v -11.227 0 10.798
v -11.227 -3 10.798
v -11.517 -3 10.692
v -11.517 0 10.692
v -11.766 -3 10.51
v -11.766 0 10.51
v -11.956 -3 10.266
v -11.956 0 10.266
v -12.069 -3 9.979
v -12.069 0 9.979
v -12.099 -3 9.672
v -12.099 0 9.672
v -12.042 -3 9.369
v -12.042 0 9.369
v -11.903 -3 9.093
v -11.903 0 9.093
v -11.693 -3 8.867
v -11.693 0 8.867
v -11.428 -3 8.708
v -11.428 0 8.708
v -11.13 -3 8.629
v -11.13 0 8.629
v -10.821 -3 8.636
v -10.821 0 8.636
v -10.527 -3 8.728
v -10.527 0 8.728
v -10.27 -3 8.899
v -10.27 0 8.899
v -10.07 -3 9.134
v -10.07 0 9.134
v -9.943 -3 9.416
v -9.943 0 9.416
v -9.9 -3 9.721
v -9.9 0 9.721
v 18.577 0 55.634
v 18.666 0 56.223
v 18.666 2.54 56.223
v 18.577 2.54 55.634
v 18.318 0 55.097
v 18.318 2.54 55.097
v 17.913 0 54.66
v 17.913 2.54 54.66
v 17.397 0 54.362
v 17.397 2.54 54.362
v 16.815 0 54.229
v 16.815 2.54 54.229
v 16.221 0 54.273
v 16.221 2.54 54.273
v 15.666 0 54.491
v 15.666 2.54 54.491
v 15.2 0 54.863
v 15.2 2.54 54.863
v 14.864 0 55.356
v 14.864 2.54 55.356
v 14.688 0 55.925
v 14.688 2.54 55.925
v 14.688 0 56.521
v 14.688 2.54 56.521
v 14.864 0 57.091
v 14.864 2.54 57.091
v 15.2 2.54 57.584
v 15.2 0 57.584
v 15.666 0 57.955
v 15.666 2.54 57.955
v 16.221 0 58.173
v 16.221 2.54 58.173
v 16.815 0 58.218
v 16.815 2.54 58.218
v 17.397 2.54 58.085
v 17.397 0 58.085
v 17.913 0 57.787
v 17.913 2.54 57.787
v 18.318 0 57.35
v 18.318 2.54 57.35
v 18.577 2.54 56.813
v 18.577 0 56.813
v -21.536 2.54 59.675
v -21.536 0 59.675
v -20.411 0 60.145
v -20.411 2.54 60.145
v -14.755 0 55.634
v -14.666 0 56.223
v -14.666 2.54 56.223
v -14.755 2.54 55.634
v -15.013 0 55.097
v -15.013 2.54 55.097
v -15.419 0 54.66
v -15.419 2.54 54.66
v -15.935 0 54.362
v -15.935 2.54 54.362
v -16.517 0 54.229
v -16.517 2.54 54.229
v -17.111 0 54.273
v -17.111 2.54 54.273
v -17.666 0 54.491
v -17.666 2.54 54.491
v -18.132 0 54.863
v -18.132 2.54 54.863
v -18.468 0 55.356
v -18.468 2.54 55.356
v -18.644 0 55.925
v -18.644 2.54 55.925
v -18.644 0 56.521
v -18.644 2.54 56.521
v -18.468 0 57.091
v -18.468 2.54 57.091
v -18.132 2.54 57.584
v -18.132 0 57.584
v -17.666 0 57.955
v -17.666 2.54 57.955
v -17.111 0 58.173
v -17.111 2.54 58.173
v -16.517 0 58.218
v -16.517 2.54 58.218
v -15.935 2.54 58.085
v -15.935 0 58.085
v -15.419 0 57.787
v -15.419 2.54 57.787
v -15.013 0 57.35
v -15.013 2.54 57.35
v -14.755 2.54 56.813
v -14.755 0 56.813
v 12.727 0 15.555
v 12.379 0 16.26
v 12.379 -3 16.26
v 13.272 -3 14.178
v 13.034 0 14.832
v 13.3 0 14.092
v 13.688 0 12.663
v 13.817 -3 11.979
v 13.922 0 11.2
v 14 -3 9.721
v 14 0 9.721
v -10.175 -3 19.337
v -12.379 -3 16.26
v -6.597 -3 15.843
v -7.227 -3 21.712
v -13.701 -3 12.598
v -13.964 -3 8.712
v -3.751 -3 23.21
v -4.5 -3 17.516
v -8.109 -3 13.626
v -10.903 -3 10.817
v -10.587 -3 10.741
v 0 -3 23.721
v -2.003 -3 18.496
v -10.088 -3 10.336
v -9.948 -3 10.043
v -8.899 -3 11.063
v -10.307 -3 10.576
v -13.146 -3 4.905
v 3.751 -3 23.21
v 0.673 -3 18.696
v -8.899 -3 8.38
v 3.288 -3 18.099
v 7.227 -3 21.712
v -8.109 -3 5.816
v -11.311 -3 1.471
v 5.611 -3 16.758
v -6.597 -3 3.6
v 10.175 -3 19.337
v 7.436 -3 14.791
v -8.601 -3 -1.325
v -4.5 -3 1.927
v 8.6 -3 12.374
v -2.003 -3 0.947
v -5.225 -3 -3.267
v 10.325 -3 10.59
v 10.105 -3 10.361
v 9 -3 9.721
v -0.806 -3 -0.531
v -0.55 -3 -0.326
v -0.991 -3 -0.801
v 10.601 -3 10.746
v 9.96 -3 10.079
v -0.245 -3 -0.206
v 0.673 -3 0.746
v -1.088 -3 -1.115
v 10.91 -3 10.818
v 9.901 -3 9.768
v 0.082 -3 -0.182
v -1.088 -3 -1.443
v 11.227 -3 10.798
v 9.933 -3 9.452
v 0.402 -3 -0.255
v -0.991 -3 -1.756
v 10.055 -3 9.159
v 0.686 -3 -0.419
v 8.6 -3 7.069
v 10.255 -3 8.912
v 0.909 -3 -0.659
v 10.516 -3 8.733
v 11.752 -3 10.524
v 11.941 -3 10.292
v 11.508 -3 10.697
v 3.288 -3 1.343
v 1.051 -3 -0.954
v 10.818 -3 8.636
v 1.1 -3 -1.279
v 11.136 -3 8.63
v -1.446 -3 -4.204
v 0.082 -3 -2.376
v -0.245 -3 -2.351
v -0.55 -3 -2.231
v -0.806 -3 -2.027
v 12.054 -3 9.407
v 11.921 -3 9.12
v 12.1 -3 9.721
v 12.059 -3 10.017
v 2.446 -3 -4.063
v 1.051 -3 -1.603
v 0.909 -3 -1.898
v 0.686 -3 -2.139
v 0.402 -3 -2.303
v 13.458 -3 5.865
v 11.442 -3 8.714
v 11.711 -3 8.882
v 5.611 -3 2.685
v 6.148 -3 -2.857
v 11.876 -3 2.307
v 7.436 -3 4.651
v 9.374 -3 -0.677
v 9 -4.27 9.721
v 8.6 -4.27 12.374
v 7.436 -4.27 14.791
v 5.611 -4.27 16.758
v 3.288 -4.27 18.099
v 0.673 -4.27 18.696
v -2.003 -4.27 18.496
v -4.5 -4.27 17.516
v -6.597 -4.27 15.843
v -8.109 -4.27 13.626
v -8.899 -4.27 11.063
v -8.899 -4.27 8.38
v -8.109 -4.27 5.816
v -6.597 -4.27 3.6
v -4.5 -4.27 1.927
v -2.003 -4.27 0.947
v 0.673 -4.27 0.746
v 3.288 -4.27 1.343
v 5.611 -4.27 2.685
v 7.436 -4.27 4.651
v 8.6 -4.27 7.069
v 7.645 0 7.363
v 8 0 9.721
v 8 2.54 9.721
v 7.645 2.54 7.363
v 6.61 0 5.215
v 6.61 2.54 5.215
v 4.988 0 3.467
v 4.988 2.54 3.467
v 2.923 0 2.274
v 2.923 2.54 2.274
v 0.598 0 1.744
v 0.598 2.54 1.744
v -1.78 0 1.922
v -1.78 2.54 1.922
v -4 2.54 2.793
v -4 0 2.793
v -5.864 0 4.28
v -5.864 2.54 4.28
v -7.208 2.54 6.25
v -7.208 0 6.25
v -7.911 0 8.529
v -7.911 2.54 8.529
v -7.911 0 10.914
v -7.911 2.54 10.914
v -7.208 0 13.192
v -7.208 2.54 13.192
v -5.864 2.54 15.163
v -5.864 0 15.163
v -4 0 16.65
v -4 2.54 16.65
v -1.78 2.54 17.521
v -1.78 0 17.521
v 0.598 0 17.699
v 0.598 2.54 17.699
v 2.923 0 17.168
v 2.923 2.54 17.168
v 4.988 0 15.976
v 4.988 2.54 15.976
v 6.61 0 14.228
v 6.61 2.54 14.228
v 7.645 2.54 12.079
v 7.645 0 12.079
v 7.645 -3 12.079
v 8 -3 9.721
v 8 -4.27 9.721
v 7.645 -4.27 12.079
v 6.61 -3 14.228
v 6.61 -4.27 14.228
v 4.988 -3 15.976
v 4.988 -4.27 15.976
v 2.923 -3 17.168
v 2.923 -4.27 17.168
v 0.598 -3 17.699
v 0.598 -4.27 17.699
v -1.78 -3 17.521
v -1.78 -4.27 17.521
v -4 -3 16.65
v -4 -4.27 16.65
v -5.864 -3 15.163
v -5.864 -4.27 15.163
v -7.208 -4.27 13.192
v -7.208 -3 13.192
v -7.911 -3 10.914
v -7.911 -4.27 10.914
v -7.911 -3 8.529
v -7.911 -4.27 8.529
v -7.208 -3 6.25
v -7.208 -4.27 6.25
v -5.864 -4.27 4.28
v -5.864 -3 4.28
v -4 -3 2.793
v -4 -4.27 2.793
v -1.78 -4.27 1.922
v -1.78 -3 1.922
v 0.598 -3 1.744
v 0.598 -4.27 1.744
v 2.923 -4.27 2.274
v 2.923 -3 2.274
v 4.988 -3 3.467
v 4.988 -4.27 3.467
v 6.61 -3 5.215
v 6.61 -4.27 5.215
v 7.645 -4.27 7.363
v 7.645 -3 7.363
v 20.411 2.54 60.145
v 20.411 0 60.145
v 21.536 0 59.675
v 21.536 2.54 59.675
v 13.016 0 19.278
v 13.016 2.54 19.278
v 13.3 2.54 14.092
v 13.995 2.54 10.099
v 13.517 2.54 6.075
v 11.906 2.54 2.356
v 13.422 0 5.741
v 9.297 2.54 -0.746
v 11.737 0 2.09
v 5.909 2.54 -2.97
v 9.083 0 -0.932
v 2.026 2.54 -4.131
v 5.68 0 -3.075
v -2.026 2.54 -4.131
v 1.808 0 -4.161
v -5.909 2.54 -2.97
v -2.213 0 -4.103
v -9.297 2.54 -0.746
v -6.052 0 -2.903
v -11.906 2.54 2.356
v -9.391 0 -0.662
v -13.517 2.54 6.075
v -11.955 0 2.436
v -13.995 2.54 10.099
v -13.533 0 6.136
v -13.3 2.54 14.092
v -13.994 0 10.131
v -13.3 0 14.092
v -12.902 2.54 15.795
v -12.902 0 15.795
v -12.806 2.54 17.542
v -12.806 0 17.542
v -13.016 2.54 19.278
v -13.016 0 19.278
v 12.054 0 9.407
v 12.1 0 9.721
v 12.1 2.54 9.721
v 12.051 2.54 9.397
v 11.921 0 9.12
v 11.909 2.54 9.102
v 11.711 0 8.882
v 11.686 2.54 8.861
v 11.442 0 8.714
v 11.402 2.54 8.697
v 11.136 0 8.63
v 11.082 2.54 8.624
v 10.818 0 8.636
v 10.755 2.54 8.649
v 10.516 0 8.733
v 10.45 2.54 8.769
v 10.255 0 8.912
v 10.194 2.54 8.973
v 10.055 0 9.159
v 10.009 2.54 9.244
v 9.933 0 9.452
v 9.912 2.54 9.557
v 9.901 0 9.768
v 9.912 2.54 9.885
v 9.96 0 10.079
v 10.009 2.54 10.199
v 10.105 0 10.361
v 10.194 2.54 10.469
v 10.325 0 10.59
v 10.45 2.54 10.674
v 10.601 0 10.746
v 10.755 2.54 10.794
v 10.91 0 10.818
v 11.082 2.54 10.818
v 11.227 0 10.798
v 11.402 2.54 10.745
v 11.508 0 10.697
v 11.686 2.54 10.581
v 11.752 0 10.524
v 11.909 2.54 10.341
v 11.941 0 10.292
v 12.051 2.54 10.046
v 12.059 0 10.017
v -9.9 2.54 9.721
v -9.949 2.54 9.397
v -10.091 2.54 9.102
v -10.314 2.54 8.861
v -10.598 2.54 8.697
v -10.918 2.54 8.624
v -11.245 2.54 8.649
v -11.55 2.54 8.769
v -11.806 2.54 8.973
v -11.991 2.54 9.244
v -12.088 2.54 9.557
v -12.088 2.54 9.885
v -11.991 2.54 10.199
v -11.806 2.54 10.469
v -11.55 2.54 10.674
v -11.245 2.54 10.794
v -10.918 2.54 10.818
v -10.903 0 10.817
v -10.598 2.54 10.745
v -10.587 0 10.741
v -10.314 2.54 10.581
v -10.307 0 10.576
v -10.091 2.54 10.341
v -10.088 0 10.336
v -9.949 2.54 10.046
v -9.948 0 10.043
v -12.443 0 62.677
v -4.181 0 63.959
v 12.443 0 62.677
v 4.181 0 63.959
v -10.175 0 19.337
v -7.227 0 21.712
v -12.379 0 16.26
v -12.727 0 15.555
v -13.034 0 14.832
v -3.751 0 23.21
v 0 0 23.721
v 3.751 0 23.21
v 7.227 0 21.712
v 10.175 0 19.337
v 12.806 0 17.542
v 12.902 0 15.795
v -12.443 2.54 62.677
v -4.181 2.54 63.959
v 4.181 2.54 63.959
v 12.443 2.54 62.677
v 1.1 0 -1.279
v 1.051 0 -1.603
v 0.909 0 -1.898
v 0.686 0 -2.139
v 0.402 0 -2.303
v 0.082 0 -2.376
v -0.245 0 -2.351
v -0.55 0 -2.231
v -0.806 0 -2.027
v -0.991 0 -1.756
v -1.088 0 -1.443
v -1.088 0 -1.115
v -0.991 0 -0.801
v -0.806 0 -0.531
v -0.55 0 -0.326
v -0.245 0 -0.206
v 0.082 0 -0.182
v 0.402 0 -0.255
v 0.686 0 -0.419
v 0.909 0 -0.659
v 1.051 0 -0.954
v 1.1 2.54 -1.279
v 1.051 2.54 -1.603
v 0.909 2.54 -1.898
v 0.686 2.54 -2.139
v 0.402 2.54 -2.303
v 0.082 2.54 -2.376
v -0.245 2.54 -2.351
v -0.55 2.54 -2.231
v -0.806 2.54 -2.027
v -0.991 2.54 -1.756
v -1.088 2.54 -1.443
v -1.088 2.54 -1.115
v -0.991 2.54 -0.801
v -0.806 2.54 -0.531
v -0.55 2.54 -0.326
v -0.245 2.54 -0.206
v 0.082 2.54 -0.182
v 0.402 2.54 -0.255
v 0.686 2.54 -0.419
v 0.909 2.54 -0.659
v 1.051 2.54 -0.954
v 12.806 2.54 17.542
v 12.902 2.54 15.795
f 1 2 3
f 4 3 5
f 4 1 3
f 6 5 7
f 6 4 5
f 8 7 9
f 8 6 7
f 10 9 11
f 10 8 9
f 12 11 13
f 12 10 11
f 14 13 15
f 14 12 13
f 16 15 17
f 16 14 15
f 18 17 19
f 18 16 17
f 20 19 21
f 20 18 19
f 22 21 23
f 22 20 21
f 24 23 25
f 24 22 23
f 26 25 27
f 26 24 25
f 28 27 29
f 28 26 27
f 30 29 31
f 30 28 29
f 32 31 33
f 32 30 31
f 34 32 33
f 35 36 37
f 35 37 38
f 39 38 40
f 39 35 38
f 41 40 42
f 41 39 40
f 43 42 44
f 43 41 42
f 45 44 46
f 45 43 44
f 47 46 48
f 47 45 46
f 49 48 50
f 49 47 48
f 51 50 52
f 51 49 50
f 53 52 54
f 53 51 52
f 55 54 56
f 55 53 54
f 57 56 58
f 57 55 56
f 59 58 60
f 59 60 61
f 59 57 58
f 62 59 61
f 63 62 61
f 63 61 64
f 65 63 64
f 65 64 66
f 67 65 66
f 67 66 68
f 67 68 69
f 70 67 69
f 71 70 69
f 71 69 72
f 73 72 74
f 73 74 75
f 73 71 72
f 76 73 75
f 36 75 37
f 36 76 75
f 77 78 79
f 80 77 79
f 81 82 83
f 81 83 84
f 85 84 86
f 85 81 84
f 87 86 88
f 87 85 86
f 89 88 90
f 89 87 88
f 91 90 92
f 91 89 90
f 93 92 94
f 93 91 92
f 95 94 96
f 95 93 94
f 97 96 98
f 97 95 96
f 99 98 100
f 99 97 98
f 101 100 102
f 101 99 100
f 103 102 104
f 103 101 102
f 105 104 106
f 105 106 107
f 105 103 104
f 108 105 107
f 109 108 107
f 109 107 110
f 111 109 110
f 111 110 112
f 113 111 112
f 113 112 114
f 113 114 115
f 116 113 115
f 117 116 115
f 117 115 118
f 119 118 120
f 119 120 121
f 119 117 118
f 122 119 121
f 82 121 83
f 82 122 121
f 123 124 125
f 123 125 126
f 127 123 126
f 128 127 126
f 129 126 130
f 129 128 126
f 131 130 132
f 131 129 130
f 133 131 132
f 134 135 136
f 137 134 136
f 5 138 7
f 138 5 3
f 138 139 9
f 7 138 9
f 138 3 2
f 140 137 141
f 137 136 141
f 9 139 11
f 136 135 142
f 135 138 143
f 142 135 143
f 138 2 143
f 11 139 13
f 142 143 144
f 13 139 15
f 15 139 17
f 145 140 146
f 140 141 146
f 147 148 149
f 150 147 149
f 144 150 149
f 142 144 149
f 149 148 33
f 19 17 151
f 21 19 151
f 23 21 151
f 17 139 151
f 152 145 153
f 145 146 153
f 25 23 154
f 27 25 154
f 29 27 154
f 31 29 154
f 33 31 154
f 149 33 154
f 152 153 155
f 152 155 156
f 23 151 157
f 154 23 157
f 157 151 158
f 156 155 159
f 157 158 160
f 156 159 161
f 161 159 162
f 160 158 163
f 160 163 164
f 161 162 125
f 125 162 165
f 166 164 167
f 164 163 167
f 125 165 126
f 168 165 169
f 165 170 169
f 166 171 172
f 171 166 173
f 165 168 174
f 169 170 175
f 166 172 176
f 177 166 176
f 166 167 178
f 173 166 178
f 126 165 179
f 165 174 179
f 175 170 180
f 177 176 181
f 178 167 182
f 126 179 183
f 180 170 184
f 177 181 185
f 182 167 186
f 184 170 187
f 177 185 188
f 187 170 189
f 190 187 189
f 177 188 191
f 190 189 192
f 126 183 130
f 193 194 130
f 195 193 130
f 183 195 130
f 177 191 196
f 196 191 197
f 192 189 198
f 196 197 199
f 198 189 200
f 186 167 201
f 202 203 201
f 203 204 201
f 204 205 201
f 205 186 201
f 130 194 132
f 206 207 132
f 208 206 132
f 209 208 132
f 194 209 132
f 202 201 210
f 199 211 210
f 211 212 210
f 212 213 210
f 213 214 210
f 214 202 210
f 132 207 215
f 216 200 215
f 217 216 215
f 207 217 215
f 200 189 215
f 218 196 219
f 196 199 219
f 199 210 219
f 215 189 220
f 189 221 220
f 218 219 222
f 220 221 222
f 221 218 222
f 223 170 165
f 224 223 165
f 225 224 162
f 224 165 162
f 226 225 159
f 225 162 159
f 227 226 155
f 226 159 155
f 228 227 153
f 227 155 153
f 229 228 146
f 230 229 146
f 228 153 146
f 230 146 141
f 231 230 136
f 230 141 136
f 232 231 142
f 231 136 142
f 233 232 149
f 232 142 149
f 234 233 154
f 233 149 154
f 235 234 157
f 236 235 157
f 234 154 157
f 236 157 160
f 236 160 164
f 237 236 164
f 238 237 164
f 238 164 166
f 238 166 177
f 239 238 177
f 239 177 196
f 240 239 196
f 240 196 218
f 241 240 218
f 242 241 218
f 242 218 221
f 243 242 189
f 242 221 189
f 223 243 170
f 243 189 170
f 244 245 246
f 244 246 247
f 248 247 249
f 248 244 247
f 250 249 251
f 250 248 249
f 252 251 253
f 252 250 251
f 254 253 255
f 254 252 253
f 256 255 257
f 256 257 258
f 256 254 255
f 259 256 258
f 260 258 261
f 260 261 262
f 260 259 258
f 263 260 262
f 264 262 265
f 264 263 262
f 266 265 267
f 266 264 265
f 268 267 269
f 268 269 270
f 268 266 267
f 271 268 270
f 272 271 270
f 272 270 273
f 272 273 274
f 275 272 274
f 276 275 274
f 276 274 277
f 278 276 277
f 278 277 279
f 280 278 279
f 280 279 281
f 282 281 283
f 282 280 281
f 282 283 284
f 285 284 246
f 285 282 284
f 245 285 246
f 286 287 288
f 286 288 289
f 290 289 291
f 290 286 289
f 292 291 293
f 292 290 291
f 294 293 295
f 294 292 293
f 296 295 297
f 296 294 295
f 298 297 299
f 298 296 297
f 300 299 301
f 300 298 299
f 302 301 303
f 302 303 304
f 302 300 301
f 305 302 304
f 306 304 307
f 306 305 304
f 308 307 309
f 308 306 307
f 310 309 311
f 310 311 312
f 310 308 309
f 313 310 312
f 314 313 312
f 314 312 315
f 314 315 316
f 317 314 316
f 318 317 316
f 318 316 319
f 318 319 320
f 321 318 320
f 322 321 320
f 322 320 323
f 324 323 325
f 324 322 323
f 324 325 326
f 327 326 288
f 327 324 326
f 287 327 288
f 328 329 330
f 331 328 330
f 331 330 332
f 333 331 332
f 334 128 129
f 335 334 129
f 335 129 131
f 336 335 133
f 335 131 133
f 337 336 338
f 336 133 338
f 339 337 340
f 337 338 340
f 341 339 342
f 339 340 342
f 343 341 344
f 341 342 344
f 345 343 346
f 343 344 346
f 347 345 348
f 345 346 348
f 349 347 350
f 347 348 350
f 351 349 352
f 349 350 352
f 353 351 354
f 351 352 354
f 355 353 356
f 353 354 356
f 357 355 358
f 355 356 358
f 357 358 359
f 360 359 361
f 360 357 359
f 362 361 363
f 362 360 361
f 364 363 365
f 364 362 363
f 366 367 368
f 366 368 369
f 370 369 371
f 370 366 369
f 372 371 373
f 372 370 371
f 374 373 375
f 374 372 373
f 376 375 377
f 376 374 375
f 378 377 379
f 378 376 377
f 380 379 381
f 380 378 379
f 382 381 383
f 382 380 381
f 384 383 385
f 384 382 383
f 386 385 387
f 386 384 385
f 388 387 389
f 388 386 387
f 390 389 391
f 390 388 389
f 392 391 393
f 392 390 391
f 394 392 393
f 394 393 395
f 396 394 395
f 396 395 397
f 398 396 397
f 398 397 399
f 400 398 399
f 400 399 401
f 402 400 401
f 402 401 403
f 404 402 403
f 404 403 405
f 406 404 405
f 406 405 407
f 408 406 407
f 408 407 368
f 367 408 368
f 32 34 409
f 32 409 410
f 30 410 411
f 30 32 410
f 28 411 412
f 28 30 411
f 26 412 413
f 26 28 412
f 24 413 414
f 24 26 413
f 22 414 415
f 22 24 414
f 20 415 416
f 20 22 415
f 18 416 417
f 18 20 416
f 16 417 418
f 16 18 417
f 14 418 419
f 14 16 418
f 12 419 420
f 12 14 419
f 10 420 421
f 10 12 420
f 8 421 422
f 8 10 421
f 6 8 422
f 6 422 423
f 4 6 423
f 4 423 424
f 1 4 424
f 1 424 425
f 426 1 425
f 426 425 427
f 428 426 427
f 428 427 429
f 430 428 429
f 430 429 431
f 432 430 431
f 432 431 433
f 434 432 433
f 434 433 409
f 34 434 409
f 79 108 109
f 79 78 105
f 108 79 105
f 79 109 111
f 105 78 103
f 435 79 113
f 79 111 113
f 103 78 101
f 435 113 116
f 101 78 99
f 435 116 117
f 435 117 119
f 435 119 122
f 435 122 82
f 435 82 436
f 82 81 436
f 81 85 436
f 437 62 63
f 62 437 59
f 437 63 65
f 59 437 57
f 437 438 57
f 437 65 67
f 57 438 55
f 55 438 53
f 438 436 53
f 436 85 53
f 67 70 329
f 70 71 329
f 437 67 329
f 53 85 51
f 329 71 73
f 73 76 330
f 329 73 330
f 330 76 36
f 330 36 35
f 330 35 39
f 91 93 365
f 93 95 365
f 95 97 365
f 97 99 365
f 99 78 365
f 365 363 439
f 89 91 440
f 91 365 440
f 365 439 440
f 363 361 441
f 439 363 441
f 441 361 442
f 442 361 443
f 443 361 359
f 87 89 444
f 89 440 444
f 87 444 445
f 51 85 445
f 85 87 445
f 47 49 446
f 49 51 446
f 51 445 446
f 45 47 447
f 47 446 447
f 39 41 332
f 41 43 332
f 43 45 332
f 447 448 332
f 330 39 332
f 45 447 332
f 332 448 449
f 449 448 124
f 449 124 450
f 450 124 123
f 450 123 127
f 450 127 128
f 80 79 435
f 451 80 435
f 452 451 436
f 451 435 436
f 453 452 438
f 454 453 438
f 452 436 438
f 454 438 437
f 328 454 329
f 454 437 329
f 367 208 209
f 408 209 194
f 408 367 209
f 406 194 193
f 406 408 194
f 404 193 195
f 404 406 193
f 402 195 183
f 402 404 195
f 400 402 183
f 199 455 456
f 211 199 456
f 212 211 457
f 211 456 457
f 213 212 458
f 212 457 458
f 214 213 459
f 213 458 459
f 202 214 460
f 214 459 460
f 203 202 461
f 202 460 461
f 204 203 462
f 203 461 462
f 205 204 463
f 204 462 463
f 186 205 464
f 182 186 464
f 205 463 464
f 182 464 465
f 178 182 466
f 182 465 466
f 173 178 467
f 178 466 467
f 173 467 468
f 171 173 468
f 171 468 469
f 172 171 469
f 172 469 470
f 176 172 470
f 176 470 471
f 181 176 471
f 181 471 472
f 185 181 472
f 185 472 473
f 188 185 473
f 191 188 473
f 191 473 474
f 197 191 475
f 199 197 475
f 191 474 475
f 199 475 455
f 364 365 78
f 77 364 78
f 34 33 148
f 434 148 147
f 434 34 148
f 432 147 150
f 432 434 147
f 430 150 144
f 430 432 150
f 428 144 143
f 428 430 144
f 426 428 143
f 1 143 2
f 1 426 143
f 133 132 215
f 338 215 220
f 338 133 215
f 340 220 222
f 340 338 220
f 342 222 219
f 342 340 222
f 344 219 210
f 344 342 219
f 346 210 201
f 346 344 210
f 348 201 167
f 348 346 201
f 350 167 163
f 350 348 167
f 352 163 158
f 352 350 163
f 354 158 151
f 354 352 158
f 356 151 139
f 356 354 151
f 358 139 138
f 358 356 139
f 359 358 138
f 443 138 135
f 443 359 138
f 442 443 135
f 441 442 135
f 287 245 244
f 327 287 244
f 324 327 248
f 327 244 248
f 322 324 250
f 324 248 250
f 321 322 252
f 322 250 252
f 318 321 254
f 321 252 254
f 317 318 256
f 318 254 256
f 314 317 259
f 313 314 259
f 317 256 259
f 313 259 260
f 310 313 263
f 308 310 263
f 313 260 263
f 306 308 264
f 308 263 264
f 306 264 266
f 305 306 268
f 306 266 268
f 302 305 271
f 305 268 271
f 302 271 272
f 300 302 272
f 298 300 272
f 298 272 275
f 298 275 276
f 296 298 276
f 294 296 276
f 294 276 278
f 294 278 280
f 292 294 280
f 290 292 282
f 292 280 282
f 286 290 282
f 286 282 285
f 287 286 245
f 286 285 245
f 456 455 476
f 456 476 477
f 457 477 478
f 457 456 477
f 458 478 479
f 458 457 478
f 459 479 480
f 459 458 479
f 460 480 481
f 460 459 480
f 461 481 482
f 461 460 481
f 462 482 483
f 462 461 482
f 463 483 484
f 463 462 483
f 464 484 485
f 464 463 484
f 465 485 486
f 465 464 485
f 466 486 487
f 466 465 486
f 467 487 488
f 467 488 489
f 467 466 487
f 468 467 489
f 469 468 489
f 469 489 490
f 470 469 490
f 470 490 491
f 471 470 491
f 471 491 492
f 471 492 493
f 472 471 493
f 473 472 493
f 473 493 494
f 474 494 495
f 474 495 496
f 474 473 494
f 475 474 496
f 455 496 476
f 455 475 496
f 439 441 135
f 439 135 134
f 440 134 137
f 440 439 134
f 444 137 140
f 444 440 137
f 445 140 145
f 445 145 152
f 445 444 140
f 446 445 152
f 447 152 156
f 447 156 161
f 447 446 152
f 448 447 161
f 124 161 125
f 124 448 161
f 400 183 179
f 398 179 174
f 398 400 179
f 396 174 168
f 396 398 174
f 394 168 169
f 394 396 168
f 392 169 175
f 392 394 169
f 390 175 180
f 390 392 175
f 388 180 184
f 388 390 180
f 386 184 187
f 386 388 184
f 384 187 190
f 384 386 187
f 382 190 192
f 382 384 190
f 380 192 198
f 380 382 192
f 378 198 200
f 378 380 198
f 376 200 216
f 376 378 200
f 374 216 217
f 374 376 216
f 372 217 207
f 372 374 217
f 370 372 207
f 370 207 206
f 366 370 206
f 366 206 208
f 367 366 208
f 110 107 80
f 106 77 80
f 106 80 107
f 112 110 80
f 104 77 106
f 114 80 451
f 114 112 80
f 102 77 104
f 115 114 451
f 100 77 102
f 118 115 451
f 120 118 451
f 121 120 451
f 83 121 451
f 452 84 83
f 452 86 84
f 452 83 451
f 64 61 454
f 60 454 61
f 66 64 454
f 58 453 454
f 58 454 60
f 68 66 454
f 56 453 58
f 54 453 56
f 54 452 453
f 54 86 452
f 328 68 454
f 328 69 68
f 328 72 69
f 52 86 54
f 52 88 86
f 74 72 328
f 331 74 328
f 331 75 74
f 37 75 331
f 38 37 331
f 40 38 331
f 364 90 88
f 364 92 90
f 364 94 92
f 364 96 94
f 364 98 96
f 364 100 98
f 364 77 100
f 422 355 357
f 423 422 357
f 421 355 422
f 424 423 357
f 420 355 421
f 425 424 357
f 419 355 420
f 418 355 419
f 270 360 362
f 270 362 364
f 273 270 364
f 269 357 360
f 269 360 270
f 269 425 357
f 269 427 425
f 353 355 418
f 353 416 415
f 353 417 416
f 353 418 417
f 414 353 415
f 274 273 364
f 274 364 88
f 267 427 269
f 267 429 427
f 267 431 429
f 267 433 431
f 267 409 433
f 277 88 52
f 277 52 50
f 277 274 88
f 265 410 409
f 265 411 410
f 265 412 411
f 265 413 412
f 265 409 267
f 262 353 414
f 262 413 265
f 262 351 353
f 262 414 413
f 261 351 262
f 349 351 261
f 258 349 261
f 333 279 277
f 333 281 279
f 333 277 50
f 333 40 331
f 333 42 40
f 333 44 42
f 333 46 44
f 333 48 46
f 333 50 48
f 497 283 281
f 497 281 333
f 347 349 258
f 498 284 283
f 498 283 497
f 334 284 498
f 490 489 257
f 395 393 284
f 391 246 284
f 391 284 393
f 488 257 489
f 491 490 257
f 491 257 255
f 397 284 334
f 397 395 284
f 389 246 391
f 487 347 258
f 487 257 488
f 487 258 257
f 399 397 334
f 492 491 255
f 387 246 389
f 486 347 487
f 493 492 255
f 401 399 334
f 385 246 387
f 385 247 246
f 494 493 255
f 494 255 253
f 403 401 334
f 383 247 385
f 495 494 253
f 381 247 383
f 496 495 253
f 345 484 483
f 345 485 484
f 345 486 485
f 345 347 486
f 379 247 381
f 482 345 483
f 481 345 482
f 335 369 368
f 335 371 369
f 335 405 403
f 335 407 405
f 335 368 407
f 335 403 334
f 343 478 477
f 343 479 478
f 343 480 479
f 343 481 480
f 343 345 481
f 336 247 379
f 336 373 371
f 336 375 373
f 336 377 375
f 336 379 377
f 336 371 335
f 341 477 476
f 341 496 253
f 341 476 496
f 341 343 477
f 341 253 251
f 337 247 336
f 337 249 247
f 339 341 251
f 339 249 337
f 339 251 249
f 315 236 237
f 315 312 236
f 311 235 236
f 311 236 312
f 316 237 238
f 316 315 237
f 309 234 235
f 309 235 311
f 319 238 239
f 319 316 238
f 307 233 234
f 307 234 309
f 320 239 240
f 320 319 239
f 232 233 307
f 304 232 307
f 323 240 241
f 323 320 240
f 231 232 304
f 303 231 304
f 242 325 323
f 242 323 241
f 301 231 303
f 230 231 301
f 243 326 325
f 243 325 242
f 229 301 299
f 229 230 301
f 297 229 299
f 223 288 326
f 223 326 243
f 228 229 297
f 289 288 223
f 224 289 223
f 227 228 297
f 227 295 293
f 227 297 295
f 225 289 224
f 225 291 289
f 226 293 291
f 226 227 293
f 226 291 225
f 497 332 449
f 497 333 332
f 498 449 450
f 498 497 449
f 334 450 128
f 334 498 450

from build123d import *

# Parameters (mm, degrees)
SKETCH1_R           = 1.999999943
SKETCH1_R_2         = 1.1
SKETCH1_R_3         = 8
BOSS_EXTRUDE1_DEPTH = 2.54
FILLET2_R           = 10
BOSS_EXTRUDE2_START = -2.999994
SKETCH1_4_R         = 8
SKETCH1_4_R_2       = 1.1
BOSS_EXTRUDE2_DEPTH = 2.999994
BOSS_EXTRUDE3_START = 1.27
SKETCH2_R           = 9
SKETCH2_R_2         = 8
BOSS_EXTRUDE3_DEPTH = 1.27


with BuildPart() as part:
    # Sketch1 → Boss-Extrude1 (new body)
    with BuildSketch(Plane(origin=(0, 0, 0), x_dir=(1, 0, 0), z_dir=(0, 1, 0))):
        with BuildLine():
            Line((20.411129853, -60.145086441), (21.536156884, -59.674942586))
            Line((21.536156884, -59.674942586), (12.379162196, -16.260133485))
            ThreePointArc((12.379162196, -16.260133485), (0, 4.278699998), (-12.379162196, -16.260133485))
            Line((-12.379162196, -16.260133485), (-21.536156884, -59.674942586))
            Line((-21.536156884, -59.674942586), (-20.411129853, -60.145086441))
            ThreePointArc((-20.411129853, -60.145086441), (0, -64.119576268), (20.411129853, -60.145086441))
        make_face()
        with Locations((-16.665975394, -56.223288884)):
            Circle(SKETCH1_R, mode=Mode.SUBTRACT)
        with Locations((16.665975394, -56.223288884)):
            Circle(SKETCH1_R, mode=Mode.SUBTRACT)
        with Locations((-11, -9.721300002)):
            Circle(SKETCH1_R_2, mode=Mode.SUBTRACT)
        with Locations((0, -9.721300002)):
            Circle(SKETCH1_R_3, mode=Mode.SUBTRACT)
        with Locations((0, 1.278699998)):
            Circle(SKETCH1_R_2, mode=Mode.SUBTRACT)
        with Locations((11, -9.721300002)):
            Circle(SKETCH1_R_2, mode=Mode.SUBTRACT)
    extrude(amount=BOSS_EXTRUDE1_DEPTH)

    # Fillet2
    fillet2_edges = [part.edges().sort_by_distance(p)[0] for p in [
        (-12.379162196, 1.27, 16.260133485),
        (12.379162196, 1.27, 16.260133485),
    ]]
    fillet(fillet2_edges, radius=FILLET2_R)

    # Sketch1<4> → Boss-Extrude2 (add)
    with BuildSketch(Plane(origin=(0, 0, 0), x_dir=(1, 0, 0), z_dir=(0, 1, 0)).offset(BOSS_EXTRUDE2_START)):
        with BuildLine():
            ThreePointArc((-12.379162196, -16.260133485), (0, -23.721300002), (12.379162196, -16.260133485))
            ThreePointArc((12.379162196, -16.260133485), (13.588750324, -13.089662308), (14, -9.721300002))
            ThreePointArc((14, -9.721300002), (-3.368362306, 3.867450323), (-12.379162196, -16.260133485))
        make_face()
        with BuildLine():
            ThreePointArc((-9.9, -9.721300002), (-10.307077747, -10.575617712), (-11.22701591, -10.797619553))
            ThreePointArc((-11.22701591, -10.797619553), (-11.692922253, -8.866982291), (-9.9, -9.721300002))
        make_face(mode=Mode.SUBTRACT)
        with Locations((0, -9.721300002)):
            Circle(SKETCH1_4_R, mode=Mode.SUBTRACT)
        with Locations((0, 1.278699998)):
            Circle(SKETCH1_4_R_2, mode=Mode.SUBTRACT)
        with BuildLine():
            ThreePointArc((12.1, -9.721300002), (11.854317711, -10.414222255), (11.22701591, -10.797619553))
            ThreePointArc((11.22701591, -10.797619553), (10.145682289, -9.028377748), (12.1, -9.721300002))
        make_face(mode=Mode.SUBTRACT)
    extrude(amount=BOSS_EXTRUDE2_DEPTH)

    # Sketch2 → Boss-Extrude3 (add)
    with BuildSketch(Plane.XZ.offset(2.999994).offset(BOSS_EXTRUDE3_START)):
        with Locations((0, 9.721300002)):
            Circle(SKETCH2_R)
        with Locations((0, 9.721300002)):
            Circle(SKETCH2_R_2, mode=Mode.SUBTRACT)
    extrude(amount=-BOSS_EXTRUDE3_DEPTH)


solid = part.part
